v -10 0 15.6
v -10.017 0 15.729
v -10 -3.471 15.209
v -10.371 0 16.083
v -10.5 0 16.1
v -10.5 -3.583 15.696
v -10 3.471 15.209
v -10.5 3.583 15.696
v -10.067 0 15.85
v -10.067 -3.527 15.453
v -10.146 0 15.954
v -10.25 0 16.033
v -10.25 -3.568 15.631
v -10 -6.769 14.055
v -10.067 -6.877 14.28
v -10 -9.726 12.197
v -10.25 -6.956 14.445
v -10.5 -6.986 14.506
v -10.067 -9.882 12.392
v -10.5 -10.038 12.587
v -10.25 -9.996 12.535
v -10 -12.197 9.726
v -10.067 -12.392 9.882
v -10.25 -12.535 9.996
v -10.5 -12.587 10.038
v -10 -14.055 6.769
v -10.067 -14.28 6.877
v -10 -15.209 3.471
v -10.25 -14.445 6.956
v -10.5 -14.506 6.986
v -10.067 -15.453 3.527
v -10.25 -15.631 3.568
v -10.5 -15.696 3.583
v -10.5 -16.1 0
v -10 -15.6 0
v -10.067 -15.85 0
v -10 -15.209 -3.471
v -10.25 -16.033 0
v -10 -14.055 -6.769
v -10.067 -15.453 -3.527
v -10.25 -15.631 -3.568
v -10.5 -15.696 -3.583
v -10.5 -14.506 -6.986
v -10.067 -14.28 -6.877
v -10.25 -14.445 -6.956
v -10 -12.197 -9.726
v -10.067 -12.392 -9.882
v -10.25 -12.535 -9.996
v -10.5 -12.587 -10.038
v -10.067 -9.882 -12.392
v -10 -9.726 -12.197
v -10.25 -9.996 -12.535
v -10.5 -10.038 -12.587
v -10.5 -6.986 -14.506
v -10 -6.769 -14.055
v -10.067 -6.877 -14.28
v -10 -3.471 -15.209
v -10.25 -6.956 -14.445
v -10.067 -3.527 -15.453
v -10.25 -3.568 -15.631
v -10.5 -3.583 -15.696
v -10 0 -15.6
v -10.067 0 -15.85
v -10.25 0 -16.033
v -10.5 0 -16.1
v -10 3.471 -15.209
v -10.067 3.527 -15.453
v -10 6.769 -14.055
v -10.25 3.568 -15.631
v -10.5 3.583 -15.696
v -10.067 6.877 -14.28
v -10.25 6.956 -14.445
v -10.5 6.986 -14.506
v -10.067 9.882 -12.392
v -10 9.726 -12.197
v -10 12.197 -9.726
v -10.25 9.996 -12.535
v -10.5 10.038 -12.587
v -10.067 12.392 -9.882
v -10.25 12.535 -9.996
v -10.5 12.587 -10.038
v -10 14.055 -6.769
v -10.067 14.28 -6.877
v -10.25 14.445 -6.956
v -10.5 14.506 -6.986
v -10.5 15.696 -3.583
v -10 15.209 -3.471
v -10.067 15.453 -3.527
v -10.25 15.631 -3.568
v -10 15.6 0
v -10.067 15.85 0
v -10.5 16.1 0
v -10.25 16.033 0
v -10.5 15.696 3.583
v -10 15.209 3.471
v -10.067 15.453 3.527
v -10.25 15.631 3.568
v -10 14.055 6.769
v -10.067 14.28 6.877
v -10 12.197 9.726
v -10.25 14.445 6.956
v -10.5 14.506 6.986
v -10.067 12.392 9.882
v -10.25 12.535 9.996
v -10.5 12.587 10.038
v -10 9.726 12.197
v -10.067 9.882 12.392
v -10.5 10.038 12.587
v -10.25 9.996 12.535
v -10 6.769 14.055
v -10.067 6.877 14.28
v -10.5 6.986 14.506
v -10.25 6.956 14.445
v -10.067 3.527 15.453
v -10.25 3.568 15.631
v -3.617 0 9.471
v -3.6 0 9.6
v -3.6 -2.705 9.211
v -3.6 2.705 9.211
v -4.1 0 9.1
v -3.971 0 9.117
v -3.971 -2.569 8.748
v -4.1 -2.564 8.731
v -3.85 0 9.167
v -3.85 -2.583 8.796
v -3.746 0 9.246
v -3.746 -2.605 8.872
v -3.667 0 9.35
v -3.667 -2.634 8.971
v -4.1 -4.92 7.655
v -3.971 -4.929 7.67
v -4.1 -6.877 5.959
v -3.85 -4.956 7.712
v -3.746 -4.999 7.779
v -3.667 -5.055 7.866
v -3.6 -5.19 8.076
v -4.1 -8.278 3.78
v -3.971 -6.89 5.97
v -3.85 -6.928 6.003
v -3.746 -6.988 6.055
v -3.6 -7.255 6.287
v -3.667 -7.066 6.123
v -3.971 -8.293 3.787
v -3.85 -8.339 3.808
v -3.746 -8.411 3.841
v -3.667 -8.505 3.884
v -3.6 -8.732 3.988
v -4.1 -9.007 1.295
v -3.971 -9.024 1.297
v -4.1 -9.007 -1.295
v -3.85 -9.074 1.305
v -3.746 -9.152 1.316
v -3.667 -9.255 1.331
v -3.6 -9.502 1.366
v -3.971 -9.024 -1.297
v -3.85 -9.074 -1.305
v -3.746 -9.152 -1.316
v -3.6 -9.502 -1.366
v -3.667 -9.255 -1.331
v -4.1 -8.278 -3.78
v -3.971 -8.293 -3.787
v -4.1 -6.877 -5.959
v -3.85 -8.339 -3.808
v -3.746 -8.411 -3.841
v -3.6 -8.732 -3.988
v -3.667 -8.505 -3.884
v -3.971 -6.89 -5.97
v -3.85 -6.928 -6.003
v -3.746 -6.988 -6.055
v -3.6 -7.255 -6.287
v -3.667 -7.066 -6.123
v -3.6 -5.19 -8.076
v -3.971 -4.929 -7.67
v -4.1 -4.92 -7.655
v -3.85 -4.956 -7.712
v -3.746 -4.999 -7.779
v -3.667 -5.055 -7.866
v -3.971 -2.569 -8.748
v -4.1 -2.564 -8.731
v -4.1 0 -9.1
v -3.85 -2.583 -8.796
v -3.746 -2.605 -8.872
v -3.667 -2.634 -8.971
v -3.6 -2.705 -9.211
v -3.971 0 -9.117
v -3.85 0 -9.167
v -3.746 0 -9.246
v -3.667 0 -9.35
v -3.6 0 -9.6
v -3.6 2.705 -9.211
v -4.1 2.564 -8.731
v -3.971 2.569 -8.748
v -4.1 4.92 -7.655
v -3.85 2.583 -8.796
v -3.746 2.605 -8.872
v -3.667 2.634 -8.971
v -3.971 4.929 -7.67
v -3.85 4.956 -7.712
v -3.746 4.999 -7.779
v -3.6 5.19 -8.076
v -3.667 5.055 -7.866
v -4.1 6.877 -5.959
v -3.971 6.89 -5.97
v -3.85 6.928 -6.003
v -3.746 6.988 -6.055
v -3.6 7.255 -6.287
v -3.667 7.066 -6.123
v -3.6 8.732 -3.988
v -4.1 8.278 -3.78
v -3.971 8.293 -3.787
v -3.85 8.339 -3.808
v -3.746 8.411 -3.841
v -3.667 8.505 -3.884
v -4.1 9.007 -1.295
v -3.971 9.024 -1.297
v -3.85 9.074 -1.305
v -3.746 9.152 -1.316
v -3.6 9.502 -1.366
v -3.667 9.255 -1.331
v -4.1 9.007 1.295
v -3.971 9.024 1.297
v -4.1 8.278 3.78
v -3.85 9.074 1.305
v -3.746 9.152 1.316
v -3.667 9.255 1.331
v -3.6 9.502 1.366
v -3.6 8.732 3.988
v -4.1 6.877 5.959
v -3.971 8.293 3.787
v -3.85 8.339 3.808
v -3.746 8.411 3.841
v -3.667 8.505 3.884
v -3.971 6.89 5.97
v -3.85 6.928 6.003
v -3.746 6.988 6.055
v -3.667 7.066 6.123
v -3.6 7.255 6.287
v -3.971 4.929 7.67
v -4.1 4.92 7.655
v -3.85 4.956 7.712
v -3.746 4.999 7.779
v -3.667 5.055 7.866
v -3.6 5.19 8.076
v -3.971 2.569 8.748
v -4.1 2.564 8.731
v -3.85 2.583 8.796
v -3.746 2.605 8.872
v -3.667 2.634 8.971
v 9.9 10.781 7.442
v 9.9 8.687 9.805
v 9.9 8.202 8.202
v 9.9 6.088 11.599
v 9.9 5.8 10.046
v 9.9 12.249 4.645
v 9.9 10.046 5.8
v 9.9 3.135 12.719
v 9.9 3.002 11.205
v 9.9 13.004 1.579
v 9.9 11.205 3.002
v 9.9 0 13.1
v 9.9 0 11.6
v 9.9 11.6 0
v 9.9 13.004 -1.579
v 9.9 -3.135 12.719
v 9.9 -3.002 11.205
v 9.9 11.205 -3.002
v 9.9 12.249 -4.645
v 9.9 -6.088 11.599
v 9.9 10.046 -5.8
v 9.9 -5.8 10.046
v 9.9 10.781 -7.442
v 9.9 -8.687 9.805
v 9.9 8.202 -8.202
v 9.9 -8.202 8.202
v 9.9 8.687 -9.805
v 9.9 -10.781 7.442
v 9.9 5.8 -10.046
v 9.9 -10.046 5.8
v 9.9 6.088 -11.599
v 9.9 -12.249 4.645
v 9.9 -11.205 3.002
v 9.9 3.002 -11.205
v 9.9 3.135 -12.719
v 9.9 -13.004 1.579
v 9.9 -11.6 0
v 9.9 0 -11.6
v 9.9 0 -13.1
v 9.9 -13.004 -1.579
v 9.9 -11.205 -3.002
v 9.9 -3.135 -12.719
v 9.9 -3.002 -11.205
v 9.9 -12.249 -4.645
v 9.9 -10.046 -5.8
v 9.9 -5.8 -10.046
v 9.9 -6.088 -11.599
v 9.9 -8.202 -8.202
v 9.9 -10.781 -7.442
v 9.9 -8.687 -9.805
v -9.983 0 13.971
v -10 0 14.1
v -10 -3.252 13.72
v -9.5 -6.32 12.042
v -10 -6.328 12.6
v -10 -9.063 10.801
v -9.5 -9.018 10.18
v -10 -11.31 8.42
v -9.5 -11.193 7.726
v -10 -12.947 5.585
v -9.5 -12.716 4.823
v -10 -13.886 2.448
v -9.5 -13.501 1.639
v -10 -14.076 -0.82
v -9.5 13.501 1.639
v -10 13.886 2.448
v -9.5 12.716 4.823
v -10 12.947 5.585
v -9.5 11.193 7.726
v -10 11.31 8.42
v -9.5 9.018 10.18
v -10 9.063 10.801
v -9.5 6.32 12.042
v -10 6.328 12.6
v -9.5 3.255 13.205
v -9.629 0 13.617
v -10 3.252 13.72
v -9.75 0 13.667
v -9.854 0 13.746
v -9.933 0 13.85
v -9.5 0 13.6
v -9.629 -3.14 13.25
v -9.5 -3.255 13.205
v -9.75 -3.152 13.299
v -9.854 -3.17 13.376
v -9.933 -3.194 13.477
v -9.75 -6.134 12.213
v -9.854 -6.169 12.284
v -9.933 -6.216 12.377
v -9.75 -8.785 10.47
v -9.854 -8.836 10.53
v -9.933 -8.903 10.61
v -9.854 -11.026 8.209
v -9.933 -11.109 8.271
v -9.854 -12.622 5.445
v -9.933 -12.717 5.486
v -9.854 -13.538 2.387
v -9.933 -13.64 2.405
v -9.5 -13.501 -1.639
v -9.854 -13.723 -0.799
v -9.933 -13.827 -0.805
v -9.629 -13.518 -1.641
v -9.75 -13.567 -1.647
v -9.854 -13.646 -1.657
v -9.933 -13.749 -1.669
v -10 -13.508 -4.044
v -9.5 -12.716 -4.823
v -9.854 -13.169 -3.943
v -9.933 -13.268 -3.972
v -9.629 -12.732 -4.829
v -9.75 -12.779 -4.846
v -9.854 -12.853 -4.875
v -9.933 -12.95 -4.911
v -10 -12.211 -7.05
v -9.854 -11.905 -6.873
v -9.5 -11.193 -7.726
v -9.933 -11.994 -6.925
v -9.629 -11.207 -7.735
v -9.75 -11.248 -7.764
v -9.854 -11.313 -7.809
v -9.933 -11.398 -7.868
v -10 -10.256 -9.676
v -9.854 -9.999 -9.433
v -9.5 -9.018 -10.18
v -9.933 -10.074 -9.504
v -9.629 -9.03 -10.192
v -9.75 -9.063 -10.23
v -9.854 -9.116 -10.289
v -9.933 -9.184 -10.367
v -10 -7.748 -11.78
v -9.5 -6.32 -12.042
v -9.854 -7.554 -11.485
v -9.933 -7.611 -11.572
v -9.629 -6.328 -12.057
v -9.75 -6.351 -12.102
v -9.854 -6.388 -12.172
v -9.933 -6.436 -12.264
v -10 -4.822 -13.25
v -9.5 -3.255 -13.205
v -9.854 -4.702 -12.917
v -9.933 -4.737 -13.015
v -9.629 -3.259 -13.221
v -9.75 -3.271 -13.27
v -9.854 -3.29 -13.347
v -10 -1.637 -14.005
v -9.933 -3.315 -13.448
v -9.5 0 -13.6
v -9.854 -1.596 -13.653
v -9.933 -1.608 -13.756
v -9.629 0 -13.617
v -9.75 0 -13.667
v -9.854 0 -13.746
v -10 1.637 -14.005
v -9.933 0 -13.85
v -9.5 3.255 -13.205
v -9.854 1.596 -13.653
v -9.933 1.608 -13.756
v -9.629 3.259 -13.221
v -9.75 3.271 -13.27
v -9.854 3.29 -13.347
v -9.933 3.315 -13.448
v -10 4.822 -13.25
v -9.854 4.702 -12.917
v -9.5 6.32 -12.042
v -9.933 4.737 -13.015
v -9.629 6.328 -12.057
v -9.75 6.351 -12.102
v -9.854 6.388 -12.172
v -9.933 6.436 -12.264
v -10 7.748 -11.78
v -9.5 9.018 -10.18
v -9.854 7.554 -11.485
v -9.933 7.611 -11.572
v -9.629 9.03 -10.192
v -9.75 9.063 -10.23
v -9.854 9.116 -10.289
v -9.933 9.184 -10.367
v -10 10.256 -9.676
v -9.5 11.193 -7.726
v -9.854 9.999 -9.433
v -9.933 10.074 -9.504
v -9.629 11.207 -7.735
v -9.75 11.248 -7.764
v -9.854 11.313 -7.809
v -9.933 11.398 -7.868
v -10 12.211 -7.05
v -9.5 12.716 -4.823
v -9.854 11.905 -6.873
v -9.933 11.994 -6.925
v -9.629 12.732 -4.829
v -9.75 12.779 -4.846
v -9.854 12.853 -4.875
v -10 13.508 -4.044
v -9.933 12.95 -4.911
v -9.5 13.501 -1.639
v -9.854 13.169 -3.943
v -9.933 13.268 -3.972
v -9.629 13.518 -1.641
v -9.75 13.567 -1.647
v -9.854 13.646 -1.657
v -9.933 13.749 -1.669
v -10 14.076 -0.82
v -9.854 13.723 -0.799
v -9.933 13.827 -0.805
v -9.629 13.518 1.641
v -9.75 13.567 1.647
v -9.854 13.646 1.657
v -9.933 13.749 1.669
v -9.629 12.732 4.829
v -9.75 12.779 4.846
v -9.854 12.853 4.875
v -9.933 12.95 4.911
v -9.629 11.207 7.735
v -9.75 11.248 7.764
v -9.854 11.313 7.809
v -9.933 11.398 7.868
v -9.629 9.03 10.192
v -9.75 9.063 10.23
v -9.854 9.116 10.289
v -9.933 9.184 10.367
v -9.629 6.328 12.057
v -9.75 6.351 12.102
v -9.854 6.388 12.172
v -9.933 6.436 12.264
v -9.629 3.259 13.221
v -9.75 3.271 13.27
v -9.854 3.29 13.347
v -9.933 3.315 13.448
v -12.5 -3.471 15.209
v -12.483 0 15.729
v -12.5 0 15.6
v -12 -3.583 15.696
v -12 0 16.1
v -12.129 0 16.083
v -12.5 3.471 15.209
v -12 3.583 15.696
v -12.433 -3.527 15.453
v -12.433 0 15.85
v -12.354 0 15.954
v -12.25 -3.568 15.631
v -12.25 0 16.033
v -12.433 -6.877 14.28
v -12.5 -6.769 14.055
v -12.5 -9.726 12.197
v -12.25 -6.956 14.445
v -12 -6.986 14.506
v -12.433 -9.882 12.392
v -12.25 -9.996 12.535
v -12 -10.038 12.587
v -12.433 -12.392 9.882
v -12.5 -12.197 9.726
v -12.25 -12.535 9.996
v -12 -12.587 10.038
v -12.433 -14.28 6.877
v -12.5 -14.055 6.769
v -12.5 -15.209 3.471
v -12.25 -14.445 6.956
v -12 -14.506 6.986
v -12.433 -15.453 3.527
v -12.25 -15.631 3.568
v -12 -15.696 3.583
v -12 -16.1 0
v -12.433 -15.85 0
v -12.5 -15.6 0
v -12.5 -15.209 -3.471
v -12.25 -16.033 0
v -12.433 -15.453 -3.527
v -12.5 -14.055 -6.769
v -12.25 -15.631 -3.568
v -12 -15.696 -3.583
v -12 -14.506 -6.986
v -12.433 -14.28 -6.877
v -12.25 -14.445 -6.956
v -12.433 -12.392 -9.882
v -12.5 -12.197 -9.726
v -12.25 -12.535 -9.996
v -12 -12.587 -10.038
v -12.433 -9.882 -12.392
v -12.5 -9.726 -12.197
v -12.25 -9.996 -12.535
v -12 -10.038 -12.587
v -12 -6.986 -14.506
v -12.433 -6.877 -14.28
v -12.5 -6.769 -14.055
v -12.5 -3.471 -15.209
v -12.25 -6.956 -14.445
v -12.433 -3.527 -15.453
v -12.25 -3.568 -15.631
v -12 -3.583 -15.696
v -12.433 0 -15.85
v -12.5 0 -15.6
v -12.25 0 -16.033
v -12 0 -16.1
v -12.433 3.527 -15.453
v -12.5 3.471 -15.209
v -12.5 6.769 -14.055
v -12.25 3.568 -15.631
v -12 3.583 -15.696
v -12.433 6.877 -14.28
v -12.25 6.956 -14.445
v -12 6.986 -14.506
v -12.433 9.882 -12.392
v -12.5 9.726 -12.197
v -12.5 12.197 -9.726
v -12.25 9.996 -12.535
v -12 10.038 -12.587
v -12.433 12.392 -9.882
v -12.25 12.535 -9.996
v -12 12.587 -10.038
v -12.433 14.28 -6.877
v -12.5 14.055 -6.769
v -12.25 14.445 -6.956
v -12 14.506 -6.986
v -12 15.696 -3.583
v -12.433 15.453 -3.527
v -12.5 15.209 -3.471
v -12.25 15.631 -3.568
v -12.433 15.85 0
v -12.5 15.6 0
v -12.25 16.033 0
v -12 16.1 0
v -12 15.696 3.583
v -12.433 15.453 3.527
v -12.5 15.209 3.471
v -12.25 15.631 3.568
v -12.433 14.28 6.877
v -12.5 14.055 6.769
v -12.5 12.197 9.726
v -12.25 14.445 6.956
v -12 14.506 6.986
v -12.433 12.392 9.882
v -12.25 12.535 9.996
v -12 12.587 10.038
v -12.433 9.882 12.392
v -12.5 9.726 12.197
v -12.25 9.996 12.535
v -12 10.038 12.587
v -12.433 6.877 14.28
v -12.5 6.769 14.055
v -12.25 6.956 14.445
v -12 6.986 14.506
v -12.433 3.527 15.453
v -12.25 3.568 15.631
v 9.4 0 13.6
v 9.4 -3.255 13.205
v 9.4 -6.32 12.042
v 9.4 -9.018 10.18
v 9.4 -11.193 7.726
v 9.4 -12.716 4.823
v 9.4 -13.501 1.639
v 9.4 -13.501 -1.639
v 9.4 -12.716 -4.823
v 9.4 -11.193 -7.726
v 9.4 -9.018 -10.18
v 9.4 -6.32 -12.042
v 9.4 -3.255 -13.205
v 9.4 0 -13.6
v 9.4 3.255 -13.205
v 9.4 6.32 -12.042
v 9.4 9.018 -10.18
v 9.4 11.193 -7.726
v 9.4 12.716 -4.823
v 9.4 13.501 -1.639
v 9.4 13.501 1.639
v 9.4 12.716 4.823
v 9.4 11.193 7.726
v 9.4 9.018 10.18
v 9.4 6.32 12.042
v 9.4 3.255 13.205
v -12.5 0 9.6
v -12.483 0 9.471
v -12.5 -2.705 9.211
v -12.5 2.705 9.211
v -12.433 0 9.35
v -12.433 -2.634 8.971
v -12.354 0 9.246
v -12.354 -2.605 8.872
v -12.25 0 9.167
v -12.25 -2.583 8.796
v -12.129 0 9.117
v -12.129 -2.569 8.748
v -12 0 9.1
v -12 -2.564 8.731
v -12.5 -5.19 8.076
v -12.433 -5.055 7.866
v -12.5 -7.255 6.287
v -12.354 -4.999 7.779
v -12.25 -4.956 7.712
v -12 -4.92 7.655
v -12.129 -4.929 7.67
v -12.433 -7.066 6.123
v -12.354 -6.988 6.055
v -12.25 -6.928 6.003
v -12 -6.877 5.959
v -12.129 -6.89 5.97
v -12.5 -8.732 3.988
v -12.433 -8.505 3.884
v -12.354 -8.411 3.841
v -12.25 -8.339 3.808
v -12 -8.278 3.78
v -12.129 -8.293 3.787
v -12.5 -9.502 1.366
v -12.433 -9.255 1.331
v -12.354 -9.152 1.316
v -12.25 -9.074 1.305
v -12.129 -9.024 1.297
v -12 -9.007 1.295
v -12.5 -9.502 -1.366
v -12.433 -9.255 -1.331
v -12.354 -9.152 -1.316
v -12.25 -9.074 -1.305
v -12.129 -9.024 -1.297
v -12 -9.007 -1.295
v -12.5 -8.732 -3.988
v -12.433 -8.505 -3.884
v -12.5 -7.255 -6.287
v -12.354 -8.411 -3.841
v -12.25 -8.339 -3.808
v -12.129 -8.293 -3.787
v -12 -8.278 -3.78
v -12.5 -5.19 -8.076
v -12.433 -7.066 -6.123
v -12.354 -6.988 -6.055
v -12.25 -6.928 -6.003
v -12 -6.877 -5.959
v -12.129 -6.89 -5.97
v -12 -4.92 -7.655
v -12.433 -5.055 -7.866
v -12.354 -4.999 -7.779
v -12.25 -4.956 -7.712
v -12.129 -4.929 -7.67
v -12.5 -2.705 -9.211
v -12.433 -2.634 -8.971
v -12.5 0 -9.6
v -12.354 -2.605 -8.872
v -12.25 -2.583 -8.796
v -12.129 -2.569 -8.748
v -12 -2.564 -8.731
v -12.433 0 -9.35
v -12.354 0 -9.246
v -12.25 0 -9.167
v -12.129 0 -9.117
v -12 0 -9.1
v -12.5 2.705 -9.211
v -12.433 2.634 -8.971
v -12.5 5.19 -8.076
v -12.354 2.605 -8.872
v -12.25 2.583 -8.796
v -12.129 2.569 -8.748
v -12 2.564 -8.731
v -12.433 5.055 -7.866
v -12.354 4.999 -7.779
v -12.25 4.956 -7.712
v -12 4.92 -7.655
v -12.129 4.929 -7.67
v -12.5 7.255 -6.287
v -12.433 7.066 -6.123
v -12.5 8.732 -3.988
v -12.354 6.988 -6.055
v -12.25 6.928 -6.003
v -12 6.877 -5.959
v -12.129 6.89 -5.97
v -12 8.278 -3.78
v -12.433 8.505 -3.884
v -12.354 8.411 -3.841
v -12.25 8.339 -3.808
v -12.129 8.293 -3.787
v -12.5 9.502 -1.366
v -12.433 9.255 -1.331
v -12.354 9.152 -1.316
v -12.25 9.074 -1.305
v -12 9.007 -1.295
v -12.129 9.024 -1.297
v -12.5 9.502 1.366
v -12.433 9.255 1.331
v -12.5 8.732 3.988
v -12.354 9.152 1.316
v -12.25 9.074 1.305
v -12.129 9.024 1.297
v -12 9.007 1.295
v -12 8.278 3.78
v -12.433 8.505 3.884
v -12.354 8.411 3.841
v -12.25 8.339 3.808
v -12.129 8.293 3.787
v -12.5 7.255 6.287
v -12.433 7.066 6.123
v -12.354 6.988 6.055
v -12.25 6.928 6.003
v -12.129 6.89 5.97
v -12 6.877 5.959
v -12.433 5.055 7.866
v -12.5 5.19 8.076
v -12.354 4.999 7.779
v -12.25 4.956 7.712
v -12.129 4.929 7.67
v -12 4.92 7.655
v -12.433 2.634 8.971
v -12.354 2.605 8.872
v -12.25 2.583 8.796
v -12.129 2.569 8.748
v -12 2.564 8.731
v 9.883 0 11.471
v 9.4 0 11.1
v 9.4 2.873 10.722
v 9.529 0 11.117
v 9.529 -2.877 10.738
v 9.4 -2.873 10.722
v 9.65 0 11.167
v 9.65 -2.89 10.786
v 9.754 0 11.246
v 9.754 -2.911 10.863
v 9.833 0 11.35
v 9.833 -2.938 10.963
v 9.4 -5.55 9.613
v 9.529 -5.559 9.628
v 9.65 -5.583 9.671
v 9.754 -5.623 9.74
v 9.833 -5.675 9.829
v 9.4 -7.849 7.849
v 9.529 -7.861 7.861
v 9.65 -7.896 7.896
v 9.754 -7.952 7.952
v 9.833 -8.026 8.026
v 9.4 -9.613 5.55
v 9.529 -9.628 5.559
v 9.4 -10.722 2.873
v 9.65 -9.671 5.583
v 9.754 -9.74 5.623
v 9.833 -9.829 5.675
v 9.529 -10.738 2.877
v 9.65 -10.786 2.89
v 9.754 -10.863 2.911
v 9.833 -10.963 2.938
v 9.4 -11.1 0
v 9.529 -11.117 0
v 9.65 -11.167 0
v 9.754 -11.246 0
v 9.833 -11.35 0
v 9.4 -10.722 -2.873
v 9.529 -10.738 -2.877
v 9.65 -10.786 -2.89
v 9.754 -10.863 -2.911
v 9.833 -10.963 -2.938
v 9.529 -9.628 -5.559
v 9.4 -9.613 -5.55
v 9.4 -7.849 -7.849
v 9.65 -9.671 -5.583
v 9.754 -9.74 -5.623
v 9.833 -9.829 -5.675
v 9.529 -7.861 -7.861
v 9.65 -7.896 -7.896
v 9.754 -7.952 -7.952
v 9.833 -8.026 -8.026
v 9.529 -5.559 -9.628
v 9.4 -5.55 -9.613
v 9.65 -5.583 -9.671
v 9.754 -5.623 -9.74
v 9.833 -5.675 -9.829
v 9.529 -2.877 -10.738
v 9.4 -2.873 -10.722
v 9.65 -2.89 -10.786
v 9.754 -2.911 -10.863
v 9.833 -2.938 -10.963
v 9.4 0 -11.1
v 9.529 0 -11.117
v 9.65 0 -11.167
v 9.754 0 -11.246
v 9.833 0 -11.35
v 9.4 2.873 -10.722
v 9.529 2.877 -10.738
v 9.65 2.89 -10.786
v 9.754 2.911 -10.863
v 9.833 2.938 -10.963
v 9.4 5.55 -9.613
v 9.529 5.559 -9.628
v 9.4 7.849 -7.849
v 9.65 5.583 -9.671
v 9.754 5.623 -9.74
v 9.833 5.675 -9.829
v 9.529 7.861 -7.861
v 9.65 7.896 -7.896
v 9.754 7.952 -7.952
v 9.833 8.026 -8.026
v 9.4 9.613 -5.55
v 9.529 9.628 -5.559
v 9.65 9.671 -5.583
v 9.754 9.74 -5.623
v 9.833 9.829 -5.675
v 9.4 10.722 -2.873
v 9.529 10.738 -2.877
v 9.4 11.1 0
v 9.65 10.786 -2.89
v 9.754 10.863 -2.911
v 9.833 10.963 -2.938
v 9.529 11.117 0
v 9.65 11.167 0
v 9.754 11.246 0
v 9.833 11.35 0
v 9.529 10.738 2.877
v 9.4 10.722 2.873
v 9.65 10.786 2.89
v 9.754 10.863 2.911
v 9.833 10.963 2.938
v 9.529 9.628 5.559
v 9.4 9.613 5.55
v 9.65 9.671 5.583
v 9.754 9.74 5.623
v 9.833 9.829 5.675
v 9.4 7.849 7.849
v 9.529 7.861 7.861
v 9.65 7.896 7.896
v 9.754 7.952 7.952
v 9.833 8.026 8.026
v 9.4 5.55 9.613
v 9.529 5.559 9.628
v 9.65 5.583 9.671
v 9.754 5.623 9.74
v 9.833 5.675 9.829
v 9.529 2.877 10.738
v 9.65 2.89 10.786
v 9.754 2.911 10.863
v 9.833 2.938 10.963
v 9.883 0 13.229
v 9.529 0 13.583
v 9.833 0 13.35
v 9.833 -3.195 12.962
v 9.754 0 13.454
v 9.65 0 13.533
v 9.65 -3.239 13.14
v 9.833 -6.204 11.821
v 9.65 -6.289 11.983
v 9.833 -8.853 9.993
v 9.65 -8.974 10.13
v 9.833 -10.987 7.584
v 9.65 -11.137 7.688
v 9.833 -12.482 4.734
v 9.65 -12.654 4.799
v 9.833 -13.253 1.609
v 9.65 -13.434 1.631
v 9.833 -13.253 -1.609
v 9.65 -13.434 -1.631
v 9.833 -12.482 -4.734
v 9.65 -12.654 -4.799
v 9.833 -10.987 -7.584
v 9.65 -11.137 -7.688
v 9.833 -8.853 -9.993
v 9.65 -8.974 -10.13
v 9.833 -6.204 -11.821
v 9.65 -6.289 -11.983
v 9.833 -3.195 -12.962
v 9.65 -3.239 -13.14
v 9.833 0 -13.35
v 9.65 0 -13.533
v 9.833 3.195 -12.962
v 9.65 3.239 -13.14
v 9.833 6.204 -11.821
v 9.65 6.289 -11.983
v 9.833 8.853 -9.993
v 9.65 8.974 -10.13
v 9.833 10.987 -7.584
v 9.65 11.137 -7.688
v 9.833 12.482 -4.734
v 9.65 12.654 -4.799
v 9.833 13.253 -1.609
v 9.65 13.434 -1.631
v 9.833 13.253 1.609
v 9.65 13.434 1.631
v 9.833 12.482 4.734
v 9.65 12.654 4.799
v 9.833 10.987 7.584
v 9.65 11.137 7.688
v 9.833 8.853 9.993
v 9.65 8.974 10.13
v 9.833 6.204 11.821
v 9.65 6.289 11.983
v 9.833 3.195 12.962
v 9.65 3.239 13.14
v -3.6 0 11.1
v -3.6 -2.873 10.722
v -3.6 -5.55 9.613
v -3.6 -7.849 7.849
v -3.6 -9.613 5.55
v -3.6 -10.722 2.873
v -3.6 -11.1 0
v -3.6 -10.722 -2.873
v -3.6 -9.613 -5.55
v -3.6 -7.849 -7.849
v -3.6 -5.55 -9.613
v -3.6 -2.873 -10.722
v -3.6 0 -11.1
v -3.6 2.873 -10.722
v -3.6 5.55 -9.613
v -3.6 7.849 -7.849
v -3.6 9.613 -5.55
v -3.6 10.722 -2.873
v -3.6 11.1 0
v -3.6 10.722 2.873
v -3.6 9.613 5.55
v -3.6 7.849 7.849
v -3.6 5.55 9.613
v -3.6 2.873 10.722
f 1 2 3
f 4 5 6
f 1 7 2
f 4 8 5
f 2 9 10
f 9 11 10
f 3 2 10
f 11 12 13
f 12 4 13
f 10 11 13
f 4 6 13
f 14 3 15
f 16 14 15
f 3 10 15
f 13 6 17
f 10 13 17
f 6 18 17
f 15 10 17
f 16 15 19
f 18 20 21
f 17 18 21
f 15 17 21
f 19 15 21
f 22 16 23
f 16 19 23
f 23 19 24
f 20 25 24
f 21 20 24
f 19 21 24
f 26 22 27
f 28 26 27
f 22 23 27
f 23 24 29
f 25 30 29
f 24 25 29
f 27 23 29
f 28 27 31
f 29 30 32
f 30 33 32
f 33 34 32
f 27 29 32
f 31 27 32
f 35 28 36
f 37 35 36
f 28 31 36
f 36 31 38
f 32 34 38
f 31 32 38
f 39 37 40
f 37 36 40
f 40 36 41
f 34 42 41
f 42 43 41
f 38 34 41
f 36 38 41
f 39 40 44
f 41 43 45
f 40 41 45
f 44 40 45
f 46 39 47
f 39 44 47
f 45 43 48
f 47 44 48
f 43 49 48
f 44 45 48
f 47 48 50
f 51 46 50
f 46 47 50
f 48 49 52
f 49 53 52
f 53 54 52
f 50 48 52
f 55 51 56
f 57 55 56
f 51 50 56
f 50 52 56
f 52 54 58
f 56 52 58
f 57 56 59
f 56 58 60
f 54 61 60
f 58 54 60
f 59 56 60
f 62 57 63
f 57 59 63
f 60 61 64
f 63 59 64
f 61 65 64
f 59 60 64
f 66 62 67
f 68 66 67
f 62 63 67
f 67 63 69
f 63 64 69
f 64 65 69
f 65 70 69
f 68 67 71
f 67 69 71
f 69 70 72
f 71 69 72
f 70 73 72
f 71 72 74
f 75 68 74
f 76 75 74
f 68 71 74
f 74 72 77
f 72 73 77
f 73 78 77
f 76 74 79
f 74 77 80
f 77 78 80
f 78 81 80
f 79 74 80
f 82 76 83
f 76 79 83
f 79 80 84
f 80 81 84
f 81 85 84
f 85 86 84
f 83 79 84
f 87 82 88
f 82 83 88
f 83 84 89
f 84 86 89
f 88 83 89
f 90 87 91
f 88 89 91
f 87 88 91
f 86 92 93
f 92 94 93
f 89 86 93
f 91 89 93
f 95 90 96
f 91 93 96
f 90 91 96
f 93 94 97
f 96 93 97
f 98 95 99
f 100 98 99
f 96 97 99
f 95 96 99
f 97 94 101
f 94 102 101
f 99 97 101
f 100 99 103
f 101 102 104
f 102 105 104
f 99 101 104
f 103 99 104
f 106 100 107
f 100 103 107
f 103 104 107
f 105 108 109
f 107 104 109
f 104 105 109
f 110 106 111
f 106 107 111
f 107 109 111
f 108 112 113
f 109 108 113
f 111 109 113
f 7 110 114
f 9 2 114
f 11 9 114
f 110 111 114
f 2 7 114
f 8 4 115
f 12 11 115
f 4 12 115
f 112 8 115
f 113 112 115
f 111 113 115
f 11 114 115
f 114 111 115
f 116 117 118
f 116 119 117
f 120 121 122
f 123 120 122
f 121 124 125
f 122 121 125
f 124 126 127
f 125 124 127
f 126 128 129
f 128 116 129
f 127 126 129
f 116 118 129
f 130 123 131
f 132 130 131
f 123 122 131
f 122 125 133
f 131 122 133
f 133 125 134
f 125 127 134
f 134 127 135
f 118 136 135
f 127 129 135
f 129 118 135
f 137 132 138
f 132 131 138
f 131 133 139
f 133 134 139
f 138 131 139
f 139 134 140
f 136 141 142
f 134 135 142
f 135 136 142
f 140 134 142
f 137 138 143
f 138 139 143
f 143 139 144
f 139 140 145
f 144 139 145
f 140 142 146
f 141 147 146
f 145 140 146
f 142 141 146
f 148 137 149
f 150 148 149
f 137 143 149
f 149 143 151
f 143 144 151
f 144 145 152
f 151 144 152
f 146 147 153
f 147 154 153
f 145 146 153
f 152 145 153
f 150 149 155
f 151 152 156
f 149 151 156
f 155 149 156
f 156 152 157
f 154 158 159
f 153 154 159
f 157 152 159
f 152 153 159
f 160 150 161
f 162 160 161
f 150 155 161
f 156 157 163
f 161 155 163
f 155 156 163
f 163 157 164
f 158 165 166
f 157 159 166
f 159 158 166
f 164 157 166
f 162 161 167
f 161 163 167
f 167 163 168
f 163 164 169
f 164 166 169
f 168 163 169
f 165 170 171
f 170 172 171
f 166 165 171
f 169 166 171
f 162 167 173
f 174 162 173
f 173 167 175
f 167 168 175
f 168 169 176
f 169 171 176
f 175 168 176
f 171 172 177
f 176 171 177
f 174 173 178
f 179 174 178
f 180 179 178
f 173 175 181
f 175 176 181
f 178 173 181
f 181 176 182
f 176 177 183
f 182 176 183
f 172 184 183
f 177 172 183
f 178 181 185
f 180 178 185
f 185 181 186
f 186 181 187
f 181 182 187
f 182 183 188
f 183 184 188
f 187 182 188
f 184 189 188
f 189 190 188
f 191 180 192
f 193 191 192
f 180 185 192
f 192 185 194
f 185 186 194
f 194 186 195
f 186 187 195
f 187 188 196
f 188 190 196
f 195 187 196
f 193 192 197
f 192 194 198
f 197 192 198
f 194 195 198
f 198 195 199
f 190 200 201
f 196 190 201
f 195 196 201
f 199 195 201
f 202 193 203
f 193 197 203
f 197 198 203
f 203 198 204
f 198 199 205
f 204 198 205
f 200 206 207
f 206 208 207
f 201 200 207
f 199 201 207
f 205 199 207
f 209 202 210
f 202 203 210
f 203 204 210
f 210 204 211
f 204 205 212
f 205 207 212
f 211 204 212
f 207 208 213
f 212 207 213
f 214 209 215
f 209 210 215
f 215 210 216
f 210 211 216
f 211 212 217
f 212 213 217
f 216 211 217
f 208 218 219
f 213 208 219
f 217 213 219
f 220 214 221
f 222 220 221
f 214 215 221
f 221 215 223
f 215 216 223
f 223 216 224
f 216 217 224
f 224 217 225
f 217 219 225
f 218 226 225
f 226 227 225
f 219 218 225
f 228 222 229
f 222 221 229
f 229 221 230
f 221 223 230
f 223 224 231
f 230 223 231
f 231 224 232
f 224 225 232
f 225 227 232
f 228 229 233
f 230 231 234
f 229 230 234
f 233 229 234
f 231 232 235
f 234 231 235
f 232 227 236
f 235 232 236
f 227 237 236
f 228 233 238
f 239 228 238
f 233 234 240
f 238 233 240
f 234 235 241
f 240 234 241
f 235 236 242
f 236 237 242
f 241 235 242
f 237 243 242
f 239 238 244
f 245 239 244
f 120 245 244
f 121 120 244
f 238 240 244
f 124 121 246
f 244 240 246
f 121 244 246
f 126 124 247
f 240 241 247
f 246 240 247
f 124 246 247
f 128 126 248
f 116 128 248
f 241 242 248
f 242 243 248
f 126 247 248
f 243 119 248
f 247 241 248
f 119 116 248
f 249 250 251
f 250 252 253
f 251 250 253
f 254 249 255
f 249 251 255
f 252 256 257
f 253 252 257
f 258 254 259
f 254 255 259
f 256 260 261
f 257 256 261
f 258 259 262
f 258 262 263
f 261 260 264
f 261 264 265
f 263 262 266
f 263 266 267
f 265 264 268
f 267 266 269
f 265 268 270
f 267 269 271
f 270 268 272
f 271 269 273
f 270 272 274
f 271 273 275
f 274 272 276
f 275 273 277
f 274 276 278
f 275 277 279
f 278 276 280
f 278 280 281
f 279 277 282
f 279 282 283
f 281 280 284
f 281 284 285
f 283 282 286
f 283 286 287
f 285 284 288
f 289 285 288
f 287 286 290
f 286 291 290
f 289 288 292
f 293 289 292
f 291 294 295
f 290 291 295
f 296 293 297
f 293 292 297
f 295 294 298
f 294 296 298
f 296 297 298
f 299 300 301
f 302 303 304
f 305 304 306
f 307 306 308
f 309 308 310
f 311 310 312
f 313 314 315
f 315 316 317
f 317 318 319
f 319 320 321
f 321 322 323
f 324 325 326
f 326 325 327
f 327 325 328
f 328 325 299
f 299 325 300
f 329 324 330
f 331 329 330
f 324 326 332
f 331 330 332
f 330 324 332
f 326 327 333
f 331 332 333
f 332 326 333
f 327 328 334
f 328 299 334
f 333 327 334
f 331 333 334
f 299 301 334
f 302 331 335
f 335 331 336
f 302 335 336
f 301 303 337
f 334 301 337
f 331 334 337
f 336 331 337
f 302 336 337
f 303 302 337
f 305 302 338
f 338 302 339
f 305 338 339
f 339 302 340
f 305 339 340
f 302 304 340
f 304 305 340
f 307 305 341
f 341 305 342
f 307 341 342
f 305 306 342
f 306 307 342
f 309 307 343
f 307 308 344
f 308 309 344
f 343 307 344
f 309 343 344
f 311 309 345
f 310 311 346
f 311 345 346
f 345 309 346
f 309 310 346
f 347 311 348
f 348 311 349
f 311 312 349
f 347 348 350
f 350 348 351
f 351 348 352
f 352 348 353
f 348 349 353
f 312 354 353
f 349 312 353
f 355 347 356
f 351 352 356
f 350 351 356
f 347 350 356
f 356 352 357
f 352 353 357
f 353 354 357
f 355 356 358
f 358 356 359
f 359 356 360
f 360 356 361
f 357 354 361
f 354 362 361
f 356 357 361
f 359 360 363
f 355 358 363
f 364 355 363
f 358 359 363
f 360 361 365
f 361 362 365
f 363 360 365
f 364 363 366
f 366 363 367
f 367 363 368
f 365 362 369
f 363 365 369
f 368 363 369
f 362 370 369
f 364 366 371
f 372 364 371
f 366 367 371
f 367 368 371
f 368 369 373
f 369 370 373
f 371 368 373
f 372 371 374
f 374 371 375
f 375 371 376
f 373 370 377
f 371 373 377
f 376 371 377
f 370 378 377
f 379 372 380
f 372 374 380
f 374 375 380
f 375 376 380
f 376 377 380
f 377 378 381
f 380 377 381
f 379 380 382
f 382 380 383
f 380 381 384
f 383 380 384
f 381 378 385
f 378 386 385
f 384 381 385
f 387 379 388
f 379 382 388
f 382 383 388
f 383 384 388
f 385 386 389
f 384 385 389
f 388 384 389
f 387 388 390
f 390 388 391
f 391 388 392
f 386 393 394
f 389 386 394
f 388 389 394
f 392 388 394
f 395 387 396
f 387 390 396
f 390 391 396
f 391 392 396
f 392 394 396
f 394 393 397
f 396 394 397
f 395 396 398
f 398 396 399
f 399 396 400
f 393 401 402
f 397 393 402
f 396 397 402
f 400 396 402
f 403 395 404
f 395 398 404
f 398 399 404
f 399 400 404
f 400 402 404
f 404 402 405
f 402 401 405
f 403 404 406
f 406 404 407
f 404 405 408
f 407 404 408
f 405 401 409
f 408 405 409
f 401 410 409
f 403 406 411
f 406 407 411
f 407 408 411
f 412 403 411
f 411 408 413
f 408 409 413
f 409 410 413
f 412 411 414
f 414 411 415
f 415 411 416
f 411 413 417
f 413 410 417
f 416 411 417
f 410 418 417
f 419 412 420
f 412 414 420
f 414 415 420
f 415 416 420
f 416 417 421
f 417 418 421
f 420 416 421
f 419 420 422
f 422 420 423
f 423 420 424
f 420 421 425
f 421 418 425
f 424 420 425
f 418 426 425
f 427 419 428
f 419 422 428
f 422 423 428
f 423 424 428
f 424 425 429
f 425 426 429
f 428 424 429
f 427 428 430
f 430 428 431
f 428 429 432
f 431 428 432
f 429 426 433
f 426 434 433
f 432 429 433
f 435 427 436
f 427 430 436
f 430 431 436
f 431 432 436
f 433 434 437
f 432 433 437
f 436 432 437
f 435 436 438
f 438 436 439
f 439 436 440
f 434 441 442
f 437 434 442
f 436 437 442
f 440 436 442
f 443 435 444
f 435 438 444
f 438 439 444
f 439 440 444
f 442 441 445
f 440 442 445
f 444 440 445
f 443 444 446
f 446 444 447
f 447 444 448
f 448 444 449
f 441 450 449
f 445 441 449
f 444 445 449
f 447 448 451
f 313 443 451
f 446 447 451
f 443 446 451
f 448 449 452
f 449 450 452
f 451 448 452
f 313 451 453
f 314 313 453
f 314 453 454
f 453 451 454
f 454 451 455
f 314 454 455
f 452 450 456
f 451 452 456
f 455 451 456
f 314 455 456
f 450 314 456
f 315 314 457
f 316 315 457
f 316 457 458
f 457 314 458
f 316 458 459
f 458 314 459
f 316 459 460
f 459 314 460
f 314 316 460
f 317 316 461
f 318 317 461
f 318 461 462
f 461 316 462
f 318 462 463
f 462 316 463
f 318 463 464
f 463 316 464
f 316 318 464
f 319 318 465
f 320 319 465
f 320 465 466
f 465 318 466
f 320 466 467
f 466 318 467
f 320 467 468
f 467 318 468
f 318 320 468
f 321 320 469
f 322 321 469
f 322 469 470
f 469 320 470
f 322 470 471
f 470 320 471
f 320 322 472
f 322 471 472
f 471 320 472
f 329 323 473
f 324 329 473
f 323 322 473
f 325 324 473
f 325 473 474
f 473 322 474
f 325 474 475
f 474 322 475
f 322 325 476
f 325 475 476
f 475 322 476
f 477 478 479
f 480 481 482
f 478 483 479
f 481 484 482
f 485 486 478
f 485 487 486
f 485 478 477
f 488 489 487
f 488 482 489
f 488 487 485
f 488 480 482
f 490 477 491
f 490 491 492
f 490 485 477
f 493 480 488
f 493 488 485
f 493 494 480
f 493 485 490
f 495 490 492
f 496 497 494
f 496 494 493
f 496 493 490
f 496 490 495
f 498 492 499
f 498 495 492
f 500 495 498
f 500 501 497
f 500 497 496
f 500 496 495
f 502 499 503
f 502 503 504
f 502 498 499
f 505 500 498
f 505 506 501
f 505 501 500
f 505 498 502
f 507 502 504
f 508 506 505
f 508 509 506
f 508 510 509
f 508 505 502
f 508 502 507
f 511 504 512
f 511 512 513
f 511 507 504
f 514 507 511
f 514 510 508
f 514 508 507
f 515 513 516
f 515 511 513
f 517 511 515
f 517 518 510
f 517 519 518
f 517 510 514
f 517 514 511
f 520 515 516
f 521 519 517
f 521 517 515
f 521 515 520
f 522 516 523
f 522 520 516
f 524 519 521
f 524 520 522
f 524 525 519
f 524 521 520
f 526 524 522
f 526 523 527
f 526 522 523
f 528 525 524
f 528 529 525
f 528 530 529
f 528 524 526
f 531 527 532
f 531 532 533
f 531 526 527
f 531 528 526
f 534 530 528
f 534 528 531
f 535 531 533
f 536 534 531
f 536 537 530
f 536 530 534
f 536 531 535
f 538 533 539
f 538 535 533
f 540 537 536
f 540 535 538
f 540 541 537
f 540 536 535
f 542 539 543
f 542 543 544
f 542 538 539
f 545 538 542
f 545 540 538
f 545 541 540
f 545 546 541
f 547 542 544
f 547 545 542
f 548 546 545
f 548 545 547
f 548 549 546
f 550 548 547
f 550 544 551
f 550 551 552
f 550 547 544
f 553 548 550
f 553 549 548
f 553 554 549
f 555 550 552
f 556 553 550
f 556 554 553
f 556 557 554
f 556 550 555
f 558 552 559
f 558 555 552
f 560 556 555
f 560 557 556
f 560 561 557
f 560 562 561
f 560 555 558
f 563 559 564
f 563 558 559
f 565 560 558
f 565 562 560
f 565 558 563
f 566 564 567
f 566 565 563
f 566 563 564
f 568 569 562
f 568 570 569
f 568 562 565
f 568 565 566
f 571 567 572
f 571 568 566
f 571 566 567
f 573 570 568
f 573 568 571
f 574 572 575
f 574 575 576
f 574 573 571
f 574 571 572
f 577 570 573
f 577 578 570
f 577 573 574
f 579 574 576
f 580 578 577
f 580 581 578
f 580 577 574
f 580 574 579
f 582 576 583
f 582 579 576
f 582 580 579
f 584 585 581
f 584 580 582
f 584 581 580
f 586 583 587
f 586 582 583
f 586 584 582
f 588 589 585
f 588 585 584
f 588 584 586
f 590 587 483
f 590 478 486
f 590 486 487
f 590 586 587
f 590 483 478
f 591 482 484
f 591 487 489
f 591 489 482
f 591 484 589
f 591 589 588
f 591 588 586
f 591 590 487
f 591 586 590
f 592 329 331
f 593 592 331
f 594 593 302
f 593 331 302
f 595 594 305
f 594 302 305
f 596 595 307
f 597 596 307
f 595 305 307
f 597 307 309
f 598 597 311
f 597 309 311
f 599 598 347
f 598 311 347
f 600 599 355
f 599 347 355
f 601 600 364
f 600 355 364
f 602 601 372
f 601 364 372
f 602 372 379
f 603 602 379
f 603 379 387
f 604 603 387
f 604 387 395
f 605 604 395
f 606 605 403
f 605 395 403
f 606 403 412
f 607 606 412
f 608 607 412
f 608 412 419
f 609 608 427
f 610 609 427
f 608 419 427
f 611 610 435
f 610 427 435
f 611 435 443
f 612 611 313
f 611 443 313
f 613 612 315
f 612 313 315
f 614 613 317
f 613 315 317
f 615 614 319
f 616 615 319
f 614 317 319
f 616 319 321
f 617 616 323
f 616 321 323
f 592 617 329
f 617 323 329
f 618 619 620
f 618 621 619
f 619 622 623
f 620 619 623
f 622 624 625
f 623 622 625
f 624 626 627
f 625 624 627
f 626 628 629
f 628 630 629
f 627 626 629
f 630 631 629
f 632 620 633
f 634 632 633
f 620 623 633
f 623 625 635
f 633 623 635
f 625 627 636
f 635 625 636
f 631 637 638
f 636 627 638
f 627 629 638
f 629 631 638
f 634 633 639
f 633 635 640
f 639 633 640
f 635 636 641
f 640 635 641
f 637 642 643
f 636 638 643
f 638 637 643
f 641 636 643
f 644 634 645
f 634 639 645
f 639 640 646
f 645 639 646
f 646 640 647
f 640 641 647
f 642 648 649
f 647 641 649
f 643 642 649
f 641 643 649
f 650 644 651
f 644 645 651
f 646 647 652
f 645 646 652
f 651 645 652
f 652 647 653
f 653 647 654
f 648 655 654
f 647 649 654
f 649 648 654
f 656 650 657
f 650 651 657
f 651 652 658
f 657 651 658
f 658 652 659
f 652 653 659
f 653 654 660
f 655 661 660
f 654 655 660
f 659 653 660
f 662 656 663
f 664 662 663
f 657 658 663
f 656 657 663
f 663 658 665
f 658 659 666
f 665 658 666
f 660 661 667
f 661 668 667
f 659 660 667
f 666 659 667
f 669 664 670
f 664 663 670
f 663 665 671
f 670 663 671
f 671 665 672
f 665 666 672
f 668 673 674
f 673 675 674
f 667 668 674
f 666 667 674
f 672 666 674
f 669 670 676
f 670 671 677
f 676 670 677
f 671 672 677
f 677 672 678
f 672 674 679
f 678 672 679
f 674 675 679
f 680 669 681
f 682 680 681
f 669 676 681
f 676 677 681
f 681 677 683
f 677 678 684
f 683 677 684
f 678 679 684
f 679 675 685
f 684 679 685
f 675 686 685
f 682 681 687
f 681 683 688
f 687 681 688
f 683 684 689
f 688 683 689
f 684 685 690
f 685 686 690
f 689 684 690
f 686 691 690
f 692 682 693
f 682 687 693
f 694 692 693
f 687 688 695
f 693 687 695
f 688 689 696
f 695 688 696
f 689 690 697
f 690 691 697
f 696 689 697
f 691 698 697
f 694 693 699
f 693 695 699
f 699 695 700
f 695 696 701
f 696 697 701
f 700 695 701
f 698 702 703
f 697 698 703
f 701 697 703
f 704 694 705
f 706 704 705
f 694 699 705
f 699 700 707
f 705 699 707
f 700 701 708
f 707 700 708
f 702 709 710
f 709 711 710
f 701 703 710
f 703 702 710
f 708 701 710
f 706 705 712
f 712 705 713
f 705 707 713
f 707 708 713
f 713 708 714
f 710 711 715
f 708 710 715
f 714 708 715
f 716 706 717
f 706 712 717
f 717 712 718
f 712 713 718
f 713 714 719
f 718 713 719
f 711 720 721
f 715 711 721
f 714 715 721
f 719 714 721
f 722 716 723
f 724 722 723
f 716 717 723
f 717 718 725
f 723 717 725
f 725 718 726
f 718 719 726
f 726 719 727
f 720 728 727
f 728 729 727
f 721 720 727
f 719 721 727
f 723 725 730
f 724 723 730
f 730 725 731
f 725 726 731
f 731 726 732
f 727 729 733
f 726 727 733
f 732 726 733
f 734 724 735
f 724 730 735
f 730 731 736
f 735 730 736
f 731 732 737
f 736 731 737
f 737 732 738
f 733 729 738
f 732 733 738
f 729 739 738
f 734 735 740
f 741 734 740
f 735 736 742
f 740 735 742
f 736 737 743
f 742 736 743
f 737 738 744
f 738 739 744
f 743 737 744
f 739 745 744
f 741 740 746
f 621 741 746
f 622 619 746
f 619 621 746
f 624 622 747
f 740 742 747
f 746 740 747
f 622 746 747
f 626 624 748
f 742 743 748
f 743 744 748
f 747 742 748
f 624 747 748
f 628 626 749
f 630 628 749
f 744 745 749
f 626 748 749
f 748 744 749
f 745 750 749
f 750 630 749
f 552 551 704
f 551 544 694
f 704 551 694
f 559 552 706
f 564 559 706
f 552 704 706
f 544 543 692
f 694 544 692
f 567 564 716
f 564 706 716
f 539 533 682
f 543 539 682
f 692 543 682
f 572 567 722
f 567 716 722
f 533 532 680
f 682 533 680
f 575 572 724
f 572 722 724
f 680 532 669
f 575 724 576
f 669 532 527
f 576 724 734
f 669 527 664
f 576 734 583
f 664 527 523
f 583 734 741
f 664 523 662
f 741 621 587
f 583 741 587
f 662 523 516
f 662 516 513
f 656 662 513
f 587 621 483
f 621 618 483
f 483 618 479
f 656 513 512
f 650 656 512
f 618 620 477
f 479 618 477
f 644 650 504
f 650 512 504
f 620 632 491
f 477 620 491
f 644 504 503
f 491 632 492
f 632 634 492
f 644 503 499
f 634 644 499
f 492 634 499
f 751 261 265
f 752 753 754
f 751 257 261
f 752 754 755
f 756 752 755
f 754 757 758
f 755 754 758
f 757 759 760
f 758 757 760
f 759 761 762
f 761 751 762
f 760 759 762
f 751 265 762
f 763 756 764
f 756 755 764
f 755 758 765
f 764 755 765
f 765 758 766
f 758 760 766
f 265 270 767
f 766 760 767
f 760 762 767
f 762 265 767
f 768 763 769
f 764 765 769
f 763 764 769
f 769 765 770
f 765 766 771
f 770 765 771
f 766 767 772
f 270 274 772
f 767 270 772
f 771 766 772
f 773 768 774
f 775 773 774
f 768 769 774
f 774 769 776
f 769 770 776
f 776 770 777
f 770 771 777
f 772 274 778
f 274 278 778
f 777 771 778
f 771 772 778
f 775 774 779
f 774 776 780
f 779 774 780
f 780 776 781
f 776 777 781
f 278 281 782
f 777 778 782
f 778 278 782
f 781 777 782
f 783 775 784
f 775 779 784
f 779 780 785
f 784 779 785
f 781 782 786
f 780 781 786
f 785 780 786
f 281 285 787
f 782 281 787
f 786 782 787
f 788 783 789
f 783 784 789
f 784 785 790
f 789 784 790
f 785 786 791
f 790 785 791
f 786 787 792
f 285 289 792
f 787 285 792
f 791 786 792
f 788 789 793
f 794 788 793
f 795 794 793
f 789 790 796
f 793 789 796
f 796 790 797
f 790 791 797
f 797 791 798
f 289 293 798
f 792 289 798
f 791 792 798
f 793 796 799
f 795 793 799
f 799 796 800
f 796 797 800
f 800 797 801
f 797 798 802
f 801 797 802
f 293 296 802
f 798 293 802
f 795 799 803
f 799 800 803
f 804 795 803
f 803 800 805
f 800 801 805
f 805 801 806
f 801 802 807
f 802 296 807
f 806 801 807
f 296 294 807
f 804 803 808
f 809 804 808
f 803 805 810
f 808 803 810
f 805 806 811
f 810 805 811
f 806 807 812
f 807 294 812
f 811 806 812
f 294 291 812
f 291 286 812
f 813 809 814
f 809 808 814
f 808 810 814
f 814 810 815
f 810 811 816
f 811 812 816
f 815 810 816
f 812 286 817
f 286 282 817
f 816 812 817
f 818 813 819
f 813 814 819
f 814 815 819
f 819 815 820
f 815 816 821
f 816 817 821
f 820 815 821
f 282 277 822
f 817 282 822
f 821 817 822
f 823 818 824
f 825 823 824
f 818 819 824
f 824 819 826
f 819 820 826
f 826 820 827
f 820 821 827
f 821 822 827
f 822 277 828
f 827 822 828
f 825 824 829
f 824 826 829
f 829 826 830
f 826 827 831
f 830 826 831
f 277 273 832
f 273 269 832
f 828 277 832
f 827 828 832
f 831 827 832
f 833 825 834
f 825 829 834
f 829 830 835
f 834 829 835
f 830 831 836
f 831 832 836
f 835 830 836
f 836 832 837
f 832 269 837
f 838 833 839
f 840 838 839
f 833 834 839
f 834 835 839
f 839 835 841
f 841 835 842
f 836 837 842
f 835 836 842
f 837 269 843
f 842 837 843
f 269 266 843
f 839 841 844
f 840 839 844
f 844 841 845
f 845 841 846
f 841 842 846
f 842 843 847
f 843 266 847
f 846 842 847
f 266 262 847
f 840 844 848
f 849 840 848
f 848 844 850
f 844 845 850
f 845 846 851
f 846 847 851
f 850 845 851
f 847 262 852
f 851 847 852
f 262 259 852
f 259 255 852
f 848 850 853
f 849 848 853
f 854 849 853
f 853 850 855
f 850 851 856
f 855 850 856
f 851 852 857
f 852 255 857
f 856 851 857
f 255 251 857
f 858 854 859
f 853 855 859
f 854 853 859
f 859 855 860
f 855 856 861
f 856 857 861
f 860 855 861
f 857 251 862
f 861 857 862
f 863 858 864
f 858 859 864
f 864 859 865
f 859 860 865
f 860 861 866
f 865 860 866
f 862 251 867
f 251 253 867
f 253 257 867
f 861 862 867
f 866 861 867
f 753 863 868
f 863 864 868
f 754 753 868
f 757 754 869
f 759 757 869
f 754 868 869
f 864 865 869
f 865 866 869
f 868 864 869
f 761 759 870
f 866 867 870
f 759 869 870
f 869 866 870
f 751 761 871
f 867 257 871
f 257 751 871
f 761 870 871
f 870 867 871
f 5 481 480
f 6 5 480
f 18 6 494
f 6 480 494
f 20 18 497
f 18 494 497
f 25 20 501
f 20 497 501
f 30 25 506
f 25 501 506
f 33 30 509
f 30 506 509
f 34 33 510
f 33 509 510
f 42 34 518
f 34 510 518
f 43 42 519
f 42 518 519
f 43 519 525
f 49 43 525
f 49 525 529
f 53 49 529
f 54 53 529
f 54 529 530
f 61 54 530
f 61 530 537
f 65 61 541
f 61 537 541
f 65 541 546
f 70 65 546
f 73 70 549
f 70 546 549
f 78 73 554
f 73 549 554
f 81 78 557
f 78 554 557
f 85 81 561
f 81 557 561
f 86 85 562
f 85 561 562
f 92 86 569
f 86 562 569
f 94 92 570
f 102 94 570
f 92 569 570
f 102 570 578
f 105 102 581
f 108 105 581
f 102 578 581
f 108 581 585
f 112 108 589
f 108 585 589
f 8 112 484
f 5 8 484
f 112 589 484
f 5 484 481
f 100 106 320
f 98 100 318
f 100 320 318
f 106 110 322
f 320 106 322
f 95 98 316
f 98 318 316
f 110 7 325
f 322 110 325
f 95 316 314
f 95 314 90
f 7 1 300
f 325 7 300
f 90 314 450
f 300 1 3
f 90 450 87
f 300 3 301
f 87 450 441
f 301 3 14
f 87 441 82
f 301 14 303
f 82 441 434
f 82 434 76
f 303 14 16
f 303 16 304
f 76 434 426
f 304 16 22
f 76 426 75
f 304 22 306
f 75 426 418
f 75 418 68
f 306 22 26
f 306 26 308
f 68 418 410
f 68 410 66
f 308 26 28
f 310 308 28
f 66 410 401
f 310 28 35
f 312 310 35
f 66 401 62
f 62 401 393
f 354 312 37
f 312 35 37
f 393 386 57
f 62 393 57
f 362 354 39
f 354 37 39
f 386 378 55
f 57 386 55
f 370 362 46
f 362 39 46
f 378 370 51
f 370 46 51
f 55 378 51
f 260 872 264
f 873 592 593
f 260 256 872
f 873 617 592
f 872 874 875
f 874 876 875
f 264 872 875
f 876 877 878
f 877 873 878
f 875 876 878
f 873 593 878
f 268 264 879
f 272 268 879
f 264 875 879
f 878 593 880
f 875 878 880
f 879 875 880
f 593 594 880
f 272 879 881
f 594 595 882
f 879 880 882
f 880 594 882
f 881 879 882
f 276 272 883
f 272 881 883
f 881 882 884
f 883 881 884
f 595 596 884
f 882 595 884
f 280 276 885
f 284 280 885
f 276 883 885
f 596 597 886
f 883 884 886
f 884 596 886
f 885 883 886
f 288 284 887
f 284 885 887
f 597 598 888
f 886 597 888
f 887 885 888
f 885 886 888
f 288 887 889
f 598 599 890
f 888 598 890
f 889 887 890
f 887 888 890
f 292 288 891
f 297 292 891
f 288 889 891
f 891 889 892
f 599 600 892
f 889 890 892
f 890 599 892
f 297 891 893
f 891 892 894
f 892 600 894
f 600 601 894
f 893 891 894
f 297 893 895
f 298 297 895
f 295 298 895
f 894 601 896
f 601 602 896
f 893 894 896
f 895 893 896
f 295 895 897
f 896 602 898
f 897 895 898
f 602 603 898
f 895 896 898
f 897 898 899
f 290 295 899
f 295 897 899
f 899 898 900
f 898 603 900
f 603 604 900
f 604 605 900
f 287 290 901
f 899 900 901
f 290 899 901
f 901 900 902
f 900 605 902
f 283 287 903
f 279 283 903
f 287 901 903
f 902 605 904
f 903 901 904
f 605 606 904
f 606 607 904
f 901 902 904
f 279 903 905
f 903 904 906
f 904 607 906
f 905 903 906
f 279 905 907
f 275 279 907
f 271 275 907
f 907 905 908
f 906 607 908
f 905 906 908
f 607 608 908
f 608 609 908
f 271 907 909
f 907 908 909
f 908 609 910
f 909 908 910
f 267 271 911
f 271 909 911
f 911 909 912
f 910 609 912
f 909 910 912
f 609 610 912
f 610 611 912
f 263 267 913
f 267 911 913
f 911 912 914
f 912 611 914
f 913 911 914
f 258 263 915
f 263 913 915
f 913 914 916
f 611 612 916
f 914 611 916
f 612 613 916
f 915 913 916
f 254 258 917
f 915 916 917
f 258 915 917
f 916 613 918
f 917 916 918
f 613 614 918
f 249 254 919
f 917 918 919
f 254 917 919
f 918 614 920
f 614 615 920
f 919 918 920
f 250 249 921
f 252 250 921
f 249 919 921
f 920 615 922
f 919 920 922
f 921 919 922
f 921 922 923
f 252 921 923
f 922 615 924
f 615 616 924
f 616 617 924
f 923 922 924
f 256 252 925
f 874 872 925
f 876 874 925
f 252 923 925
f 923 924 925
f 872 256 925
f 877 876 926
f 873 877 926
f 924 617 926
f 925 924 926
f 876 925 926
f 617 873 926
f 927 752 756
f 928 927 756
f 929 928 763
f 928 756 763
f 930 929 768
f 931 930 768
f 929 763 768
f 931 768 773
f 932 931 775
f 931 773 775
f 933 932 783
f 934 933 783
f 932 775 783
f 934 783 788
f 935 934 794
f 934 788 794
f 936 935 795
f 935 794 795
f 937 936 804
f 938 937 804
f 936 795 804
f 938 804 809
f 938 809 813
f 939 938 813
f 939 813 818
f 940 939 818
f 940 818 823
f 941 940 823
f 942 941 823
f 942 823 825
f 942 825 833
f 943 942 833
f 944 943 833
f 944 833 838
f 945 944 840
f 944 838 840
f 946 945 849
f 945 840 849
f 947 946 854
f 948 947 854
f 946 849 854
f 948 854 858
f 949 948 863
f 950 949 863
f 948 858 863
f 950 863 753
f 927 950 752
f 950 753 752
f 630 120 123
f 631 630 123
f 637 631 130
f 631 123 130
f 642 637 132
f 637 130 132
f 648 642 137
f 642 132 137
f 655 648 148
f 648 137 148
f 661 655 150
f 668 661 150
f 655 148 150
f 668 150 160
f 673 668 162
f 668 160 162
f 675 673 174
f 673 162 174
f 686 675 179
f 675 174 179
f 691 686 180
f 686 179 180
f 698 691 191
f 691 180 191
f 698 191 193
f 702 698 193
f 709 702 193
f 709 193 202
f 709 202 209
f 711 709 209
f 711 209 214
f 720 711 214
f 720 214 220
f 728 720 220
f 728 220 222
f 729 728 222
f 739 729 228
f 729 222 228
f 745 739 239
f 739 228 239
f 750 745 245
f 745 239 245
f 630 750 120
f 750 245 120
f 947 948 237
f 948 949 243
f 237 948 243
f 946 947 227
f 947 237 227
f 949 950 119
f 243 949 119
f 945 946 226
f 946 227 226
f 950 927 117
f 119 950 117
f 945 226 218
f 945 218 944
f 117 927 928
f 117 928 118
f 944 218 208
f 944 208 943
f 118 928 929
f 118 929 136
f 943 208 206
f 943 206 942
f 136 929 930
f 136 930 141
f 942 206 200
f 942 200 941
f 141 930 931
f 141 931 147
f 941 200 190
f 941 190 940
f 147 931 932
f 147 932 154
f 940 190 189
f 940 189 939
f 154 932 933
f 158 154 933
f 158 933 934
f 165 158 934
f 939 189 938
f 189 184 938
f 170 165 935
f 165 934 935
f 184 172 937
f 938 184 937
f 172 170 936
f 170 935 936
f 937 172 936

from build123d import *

# Parameters (mm, degrees)
FILLET1_R = 0.5


with BuildPart() as part:
    # Sketch1 → Revolve1 (revolve)
    with BuildSketch(Plane.XY, mode=Mode.PRIVATE) as revolve1_sk:
        Polygon((-12.5, 16.1), (-12.5, 9.1), (-3.6, 9.1), (-3.6, 11.1), (9.9, 11.1), (9.9, 13.6), (-10, 13.6), (-10, 16.1), align=None)
    revolve(revolve1_sk.sketch.rotate(Axis((-30.849638619, 0, 0), (1, 0, 0)), 90), axis=Axis((-30.849638619, 0, 0), (1, 0, 0)))

    # Fillet1
    fillet1_edges = [part.edges().sort_by_distance(p)[0] for p in [
        (-12.5, 0, -16.1),
        (-10, 0, -16.1),
        (-10, 0, -13.6),
        (9.9, 0, -13.6),
        (9.9, 0, -11.1),
        (-3.6, 0, -9.1),
        (-12.5, 0, -9.1),
    ]]
    fillet(fillet1_edges, radius=FILLET1_R)


solid = part.part
